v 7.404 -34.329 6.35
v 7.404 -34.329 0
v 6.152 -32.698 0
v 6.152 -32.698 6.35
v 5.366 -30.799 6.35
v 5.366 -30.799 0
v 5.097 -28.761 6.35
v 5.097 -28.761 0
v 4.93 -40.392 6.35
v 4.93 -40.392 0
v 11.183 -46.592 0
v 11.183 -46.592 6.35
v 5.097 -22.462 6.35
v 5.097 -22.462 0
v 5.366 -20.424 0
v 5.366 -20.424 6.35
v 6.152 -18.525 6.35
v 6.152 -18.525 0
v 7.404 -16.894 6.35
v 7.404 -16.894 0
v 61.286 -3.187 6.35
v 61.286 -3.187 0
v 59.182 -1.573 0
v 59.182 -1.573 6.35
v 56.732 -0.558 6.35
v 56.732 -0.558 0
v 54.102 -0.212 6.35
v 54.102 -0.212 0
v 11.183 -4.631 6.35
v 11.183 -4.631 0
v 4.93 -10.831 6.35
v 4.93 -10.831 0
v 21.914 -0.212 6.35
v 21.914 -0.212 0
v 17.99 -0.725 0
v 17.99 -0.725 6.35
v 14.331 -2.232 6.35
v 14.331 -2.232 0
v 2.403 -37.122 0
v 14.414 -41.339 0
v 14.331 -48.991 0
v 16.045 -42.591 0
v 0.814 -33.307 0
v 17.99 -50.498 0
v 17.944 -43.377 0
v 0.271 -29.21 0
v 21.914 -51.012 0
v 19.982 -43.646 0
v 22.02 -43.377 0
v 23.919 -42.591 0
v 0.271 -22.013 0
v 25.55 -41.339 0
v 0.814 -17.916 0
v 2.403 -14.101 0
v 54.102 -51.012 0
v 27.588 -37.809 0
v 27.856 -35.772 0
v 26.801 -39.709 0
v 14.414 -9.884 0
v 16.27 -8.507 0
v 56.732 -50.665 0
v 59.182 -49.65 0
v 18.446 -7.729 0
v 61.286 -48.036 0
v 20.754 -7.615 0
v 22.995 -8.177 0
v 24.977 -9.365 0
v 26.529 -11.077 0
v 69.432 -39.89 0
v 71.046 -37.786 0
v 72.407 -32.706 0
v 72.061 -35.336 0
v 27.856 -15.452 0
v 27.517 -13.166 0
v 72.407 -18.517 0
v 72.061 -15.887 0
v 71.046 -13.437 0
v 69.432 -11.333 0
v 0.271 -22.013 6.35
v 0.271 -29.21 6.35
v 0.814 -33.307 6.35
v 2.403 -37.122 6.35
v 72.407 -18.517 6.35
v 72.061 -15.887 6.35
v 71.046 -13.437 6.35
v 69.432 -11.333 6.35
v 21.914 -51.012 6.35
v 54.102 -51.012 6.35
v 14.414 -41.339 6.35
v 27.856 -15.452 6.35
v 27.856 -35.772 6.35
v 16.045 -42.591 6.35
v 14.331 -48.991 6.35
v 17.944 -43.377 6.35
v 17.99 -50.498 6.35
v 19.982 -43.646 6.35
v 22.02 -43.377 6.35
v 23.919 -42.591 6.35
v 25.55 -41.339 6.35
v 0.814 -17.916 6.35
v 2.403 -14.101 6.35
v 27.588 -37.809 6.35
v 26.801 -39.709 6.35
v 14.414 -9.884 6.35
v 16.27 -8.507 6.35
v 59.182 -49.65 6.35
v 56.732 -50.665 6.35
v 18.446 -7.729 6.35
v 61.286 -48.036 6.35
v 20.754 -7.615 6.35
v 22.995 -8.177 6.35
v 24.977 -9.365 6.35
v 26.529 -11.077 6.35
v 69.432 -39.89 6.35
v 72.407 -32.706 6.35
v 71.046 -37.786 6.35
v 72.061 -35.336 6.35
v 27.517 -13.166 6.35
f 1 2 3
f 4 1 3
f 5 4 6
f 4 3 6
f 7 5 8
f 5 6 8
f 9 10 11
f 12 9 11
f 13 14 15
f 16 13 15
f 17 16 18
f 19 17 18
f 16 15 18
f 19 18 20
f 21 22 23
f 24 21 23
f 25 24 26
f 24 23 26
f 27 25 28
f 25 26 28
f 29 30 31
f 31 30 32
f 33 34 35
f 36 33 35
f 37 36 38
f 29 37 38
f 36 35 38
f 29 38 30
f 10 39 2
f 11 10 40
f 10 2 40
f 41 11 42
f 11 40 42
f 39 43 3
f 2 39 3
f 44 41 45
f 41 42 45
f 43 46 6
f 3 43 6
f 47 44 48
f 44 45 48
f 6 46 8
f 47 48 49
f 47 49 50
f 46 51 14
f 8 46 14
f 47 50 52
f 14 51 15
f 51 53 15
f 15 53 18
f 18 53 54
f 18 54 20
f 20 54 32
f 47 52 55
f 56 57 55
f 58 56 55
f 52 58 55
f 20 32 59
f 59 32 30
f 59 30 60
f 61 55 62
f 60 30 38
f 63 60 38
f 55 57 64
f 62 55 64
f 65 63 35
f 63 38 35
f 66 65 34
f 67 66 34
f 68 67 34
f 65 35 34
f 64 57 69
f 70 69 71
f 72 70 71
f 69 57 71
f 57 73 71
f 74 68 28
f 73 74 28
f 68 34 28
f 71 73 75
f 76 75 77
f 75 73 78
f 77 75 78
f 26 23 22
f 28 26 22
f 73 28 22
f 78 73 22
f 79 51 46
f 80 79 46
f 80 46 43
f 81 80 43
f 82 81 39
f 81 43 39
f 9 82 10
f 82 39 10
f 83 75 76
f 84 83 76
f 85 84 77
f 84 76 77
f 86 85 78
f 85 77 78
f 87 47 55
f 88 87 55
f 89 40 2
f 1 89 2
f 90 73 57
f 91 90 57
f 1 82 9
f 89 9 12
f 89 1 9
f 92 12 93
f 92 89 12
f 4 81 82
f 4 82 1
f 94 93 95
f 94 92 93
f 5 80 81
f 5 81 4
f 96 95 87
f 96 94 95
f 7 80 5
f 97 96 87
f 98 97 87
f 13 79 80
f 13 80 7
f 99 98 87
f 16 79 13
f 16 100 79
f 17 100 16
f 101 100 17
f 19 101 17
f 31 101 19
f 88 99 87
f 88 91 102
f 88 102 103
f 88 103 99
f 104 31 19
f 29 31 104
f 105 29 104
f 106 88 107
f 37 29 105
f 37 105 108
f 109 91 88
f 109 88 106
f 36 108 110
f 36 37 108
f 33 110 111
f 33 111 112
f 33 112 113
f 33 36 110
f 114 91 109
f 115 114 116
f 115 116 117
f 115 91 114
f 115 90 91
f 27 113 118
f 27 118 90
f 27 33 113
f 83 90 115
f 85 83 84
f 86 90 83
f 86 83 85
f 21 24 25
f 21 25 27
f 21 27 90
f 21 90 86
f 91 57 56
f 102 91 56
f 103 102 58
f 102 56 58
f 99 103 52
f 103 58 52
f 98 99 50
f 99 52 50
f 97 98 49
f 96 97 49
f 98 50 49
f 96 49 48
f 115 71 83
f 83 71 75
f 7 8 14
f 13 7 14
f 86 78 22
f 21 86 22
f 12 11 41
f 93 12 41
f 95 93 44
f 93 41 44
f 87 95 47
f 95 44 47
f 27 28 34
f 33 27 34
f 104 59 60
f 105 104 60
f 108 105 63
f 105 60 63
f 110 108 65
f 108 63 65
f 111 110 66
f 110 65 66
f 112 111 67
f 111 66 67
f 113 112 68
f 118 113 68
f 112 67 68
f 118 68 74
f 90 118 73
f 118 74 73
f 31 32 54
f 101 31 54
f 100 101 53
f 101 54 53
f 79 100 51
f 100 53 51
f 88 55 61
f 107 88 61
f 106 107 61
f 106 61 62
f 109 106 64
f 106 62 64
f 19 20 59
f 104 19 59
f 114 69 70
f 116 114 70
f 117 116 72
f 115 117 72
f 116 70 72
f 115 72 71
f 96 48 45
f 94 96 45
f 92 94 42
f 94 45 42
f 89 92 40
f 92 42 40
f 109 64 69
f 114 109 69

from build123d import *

# Parameters (mm, degrees)
F1_DEPTH = 6.35


# Not quite as in the source:
# - a feature names something its author has since deleted; it is built from what else it names


with BuildPart() as f1:
    # F0 (on Top) → F1 (new body)
    with BuildSketch(Plane.XY):
        with BuildLine():
            ThreePointArc((69.4316146906, -39.8903370424), (71.634025844, -36.5941958184), (72.4074097937, -32.7061321456))
            Line((72.4074097937, -32.7061321456), (72.4074097937, -18.516951733))
            ThreePointArc((72.4074097937, -18.516951733), (71.634025844, -14.6288880601), (69.4316146906, -11.3327468361))
            Line((69.4316146906, -11.3327468361), (61.2862048969, -3.1873370424))
            ThreePointArc((61.2862048969, -3.1873370424), (57.9900636728, -0.9849258889), (54.102, -0.2115419393))
            Line((54.102, -0.2115419393), (21.9140133571, -0.2115419393))
            ThreePointArc((21.9140133571, -0.2115419393), (16.1111416714, -1.3595484607), (11.1825133635, -4.6306127791))
            Line((11.1825133635, -4.6306127791), (4.9301931337, -10.8312609409))
            ThreePointArc((4.9301931337, -10.8312609409), (1.4826892564, -15.9562170355), (0.2714097937, -22.0128877397))
            Line((0.2714097937, -22.0128877397), (0.2714097937, -29.2101961388))
            ThreePointArc((0.2714097937, -29.2101961388), (1.4826892564, -35.266866843), (4.9301931337, -40.3918229376))
            Line((4.9301931337, -40.3918229376), (11.1825133635, -46.5924710994))
            ThreePointArc((11.1825133635, -46.5924710994), (16.1111416714, -49.8635354178), (21.9140133571, -51.0115419393))
            Line((21.9140133571, -51.0115419393), (54.102, -51.0115419393))
            ThreePointArc((54.102, -51.0115419393), (57.9900636728, -50.2381579896), (61.2862048969, -48.0357468361))
            Line((61.2862048969, -48.0357468361), (69.4316146906, -39.8903370424))
        make_face()
        with BuildLine():
            Line((27.8558097937, -15.4515419393), (27.8558097937, -35.7715419393))
            ThreePointArc((27.8558097937, -35.7715419393), (25.5495685888, -41.3393007343), (19.9818097937, -43.6455419393))
            ThreePointArc((19.9818097937, -43.6455419393), (16.9685604473, -43.0461693783), (14.4140509986, -41.3393007343))
            Line((14.4140509986, -41.3393007343), (7.4036509986, -34.3289007343))
            ThreePointArc((7.4036509986, -34.3289007343), (5.6967823547, -31.7743912857), (5.0974097937, -28.7611419393))
            Line((5.0974097937, -28.7611419393), (5.0974097937, -22.4619419393))
            ThreePointArc((5.0974097937, -22.4619419393), (5.6967823547, -19.4486925928), (7.4036509986, -16.8941831442))
            Line((7.4036509986, -16.8941831442), (14.4140509986, -9.8837831442))
            ThreePointArc((14.4140509986, -9.8837831442), (22.9950591402, -8.1769145003), (27.8558097937, -15.4515419393))
        make_face(mode=Mode.SUBTRACT)
    extrude(amount=F1_DEPTH)


solid = f1.part
